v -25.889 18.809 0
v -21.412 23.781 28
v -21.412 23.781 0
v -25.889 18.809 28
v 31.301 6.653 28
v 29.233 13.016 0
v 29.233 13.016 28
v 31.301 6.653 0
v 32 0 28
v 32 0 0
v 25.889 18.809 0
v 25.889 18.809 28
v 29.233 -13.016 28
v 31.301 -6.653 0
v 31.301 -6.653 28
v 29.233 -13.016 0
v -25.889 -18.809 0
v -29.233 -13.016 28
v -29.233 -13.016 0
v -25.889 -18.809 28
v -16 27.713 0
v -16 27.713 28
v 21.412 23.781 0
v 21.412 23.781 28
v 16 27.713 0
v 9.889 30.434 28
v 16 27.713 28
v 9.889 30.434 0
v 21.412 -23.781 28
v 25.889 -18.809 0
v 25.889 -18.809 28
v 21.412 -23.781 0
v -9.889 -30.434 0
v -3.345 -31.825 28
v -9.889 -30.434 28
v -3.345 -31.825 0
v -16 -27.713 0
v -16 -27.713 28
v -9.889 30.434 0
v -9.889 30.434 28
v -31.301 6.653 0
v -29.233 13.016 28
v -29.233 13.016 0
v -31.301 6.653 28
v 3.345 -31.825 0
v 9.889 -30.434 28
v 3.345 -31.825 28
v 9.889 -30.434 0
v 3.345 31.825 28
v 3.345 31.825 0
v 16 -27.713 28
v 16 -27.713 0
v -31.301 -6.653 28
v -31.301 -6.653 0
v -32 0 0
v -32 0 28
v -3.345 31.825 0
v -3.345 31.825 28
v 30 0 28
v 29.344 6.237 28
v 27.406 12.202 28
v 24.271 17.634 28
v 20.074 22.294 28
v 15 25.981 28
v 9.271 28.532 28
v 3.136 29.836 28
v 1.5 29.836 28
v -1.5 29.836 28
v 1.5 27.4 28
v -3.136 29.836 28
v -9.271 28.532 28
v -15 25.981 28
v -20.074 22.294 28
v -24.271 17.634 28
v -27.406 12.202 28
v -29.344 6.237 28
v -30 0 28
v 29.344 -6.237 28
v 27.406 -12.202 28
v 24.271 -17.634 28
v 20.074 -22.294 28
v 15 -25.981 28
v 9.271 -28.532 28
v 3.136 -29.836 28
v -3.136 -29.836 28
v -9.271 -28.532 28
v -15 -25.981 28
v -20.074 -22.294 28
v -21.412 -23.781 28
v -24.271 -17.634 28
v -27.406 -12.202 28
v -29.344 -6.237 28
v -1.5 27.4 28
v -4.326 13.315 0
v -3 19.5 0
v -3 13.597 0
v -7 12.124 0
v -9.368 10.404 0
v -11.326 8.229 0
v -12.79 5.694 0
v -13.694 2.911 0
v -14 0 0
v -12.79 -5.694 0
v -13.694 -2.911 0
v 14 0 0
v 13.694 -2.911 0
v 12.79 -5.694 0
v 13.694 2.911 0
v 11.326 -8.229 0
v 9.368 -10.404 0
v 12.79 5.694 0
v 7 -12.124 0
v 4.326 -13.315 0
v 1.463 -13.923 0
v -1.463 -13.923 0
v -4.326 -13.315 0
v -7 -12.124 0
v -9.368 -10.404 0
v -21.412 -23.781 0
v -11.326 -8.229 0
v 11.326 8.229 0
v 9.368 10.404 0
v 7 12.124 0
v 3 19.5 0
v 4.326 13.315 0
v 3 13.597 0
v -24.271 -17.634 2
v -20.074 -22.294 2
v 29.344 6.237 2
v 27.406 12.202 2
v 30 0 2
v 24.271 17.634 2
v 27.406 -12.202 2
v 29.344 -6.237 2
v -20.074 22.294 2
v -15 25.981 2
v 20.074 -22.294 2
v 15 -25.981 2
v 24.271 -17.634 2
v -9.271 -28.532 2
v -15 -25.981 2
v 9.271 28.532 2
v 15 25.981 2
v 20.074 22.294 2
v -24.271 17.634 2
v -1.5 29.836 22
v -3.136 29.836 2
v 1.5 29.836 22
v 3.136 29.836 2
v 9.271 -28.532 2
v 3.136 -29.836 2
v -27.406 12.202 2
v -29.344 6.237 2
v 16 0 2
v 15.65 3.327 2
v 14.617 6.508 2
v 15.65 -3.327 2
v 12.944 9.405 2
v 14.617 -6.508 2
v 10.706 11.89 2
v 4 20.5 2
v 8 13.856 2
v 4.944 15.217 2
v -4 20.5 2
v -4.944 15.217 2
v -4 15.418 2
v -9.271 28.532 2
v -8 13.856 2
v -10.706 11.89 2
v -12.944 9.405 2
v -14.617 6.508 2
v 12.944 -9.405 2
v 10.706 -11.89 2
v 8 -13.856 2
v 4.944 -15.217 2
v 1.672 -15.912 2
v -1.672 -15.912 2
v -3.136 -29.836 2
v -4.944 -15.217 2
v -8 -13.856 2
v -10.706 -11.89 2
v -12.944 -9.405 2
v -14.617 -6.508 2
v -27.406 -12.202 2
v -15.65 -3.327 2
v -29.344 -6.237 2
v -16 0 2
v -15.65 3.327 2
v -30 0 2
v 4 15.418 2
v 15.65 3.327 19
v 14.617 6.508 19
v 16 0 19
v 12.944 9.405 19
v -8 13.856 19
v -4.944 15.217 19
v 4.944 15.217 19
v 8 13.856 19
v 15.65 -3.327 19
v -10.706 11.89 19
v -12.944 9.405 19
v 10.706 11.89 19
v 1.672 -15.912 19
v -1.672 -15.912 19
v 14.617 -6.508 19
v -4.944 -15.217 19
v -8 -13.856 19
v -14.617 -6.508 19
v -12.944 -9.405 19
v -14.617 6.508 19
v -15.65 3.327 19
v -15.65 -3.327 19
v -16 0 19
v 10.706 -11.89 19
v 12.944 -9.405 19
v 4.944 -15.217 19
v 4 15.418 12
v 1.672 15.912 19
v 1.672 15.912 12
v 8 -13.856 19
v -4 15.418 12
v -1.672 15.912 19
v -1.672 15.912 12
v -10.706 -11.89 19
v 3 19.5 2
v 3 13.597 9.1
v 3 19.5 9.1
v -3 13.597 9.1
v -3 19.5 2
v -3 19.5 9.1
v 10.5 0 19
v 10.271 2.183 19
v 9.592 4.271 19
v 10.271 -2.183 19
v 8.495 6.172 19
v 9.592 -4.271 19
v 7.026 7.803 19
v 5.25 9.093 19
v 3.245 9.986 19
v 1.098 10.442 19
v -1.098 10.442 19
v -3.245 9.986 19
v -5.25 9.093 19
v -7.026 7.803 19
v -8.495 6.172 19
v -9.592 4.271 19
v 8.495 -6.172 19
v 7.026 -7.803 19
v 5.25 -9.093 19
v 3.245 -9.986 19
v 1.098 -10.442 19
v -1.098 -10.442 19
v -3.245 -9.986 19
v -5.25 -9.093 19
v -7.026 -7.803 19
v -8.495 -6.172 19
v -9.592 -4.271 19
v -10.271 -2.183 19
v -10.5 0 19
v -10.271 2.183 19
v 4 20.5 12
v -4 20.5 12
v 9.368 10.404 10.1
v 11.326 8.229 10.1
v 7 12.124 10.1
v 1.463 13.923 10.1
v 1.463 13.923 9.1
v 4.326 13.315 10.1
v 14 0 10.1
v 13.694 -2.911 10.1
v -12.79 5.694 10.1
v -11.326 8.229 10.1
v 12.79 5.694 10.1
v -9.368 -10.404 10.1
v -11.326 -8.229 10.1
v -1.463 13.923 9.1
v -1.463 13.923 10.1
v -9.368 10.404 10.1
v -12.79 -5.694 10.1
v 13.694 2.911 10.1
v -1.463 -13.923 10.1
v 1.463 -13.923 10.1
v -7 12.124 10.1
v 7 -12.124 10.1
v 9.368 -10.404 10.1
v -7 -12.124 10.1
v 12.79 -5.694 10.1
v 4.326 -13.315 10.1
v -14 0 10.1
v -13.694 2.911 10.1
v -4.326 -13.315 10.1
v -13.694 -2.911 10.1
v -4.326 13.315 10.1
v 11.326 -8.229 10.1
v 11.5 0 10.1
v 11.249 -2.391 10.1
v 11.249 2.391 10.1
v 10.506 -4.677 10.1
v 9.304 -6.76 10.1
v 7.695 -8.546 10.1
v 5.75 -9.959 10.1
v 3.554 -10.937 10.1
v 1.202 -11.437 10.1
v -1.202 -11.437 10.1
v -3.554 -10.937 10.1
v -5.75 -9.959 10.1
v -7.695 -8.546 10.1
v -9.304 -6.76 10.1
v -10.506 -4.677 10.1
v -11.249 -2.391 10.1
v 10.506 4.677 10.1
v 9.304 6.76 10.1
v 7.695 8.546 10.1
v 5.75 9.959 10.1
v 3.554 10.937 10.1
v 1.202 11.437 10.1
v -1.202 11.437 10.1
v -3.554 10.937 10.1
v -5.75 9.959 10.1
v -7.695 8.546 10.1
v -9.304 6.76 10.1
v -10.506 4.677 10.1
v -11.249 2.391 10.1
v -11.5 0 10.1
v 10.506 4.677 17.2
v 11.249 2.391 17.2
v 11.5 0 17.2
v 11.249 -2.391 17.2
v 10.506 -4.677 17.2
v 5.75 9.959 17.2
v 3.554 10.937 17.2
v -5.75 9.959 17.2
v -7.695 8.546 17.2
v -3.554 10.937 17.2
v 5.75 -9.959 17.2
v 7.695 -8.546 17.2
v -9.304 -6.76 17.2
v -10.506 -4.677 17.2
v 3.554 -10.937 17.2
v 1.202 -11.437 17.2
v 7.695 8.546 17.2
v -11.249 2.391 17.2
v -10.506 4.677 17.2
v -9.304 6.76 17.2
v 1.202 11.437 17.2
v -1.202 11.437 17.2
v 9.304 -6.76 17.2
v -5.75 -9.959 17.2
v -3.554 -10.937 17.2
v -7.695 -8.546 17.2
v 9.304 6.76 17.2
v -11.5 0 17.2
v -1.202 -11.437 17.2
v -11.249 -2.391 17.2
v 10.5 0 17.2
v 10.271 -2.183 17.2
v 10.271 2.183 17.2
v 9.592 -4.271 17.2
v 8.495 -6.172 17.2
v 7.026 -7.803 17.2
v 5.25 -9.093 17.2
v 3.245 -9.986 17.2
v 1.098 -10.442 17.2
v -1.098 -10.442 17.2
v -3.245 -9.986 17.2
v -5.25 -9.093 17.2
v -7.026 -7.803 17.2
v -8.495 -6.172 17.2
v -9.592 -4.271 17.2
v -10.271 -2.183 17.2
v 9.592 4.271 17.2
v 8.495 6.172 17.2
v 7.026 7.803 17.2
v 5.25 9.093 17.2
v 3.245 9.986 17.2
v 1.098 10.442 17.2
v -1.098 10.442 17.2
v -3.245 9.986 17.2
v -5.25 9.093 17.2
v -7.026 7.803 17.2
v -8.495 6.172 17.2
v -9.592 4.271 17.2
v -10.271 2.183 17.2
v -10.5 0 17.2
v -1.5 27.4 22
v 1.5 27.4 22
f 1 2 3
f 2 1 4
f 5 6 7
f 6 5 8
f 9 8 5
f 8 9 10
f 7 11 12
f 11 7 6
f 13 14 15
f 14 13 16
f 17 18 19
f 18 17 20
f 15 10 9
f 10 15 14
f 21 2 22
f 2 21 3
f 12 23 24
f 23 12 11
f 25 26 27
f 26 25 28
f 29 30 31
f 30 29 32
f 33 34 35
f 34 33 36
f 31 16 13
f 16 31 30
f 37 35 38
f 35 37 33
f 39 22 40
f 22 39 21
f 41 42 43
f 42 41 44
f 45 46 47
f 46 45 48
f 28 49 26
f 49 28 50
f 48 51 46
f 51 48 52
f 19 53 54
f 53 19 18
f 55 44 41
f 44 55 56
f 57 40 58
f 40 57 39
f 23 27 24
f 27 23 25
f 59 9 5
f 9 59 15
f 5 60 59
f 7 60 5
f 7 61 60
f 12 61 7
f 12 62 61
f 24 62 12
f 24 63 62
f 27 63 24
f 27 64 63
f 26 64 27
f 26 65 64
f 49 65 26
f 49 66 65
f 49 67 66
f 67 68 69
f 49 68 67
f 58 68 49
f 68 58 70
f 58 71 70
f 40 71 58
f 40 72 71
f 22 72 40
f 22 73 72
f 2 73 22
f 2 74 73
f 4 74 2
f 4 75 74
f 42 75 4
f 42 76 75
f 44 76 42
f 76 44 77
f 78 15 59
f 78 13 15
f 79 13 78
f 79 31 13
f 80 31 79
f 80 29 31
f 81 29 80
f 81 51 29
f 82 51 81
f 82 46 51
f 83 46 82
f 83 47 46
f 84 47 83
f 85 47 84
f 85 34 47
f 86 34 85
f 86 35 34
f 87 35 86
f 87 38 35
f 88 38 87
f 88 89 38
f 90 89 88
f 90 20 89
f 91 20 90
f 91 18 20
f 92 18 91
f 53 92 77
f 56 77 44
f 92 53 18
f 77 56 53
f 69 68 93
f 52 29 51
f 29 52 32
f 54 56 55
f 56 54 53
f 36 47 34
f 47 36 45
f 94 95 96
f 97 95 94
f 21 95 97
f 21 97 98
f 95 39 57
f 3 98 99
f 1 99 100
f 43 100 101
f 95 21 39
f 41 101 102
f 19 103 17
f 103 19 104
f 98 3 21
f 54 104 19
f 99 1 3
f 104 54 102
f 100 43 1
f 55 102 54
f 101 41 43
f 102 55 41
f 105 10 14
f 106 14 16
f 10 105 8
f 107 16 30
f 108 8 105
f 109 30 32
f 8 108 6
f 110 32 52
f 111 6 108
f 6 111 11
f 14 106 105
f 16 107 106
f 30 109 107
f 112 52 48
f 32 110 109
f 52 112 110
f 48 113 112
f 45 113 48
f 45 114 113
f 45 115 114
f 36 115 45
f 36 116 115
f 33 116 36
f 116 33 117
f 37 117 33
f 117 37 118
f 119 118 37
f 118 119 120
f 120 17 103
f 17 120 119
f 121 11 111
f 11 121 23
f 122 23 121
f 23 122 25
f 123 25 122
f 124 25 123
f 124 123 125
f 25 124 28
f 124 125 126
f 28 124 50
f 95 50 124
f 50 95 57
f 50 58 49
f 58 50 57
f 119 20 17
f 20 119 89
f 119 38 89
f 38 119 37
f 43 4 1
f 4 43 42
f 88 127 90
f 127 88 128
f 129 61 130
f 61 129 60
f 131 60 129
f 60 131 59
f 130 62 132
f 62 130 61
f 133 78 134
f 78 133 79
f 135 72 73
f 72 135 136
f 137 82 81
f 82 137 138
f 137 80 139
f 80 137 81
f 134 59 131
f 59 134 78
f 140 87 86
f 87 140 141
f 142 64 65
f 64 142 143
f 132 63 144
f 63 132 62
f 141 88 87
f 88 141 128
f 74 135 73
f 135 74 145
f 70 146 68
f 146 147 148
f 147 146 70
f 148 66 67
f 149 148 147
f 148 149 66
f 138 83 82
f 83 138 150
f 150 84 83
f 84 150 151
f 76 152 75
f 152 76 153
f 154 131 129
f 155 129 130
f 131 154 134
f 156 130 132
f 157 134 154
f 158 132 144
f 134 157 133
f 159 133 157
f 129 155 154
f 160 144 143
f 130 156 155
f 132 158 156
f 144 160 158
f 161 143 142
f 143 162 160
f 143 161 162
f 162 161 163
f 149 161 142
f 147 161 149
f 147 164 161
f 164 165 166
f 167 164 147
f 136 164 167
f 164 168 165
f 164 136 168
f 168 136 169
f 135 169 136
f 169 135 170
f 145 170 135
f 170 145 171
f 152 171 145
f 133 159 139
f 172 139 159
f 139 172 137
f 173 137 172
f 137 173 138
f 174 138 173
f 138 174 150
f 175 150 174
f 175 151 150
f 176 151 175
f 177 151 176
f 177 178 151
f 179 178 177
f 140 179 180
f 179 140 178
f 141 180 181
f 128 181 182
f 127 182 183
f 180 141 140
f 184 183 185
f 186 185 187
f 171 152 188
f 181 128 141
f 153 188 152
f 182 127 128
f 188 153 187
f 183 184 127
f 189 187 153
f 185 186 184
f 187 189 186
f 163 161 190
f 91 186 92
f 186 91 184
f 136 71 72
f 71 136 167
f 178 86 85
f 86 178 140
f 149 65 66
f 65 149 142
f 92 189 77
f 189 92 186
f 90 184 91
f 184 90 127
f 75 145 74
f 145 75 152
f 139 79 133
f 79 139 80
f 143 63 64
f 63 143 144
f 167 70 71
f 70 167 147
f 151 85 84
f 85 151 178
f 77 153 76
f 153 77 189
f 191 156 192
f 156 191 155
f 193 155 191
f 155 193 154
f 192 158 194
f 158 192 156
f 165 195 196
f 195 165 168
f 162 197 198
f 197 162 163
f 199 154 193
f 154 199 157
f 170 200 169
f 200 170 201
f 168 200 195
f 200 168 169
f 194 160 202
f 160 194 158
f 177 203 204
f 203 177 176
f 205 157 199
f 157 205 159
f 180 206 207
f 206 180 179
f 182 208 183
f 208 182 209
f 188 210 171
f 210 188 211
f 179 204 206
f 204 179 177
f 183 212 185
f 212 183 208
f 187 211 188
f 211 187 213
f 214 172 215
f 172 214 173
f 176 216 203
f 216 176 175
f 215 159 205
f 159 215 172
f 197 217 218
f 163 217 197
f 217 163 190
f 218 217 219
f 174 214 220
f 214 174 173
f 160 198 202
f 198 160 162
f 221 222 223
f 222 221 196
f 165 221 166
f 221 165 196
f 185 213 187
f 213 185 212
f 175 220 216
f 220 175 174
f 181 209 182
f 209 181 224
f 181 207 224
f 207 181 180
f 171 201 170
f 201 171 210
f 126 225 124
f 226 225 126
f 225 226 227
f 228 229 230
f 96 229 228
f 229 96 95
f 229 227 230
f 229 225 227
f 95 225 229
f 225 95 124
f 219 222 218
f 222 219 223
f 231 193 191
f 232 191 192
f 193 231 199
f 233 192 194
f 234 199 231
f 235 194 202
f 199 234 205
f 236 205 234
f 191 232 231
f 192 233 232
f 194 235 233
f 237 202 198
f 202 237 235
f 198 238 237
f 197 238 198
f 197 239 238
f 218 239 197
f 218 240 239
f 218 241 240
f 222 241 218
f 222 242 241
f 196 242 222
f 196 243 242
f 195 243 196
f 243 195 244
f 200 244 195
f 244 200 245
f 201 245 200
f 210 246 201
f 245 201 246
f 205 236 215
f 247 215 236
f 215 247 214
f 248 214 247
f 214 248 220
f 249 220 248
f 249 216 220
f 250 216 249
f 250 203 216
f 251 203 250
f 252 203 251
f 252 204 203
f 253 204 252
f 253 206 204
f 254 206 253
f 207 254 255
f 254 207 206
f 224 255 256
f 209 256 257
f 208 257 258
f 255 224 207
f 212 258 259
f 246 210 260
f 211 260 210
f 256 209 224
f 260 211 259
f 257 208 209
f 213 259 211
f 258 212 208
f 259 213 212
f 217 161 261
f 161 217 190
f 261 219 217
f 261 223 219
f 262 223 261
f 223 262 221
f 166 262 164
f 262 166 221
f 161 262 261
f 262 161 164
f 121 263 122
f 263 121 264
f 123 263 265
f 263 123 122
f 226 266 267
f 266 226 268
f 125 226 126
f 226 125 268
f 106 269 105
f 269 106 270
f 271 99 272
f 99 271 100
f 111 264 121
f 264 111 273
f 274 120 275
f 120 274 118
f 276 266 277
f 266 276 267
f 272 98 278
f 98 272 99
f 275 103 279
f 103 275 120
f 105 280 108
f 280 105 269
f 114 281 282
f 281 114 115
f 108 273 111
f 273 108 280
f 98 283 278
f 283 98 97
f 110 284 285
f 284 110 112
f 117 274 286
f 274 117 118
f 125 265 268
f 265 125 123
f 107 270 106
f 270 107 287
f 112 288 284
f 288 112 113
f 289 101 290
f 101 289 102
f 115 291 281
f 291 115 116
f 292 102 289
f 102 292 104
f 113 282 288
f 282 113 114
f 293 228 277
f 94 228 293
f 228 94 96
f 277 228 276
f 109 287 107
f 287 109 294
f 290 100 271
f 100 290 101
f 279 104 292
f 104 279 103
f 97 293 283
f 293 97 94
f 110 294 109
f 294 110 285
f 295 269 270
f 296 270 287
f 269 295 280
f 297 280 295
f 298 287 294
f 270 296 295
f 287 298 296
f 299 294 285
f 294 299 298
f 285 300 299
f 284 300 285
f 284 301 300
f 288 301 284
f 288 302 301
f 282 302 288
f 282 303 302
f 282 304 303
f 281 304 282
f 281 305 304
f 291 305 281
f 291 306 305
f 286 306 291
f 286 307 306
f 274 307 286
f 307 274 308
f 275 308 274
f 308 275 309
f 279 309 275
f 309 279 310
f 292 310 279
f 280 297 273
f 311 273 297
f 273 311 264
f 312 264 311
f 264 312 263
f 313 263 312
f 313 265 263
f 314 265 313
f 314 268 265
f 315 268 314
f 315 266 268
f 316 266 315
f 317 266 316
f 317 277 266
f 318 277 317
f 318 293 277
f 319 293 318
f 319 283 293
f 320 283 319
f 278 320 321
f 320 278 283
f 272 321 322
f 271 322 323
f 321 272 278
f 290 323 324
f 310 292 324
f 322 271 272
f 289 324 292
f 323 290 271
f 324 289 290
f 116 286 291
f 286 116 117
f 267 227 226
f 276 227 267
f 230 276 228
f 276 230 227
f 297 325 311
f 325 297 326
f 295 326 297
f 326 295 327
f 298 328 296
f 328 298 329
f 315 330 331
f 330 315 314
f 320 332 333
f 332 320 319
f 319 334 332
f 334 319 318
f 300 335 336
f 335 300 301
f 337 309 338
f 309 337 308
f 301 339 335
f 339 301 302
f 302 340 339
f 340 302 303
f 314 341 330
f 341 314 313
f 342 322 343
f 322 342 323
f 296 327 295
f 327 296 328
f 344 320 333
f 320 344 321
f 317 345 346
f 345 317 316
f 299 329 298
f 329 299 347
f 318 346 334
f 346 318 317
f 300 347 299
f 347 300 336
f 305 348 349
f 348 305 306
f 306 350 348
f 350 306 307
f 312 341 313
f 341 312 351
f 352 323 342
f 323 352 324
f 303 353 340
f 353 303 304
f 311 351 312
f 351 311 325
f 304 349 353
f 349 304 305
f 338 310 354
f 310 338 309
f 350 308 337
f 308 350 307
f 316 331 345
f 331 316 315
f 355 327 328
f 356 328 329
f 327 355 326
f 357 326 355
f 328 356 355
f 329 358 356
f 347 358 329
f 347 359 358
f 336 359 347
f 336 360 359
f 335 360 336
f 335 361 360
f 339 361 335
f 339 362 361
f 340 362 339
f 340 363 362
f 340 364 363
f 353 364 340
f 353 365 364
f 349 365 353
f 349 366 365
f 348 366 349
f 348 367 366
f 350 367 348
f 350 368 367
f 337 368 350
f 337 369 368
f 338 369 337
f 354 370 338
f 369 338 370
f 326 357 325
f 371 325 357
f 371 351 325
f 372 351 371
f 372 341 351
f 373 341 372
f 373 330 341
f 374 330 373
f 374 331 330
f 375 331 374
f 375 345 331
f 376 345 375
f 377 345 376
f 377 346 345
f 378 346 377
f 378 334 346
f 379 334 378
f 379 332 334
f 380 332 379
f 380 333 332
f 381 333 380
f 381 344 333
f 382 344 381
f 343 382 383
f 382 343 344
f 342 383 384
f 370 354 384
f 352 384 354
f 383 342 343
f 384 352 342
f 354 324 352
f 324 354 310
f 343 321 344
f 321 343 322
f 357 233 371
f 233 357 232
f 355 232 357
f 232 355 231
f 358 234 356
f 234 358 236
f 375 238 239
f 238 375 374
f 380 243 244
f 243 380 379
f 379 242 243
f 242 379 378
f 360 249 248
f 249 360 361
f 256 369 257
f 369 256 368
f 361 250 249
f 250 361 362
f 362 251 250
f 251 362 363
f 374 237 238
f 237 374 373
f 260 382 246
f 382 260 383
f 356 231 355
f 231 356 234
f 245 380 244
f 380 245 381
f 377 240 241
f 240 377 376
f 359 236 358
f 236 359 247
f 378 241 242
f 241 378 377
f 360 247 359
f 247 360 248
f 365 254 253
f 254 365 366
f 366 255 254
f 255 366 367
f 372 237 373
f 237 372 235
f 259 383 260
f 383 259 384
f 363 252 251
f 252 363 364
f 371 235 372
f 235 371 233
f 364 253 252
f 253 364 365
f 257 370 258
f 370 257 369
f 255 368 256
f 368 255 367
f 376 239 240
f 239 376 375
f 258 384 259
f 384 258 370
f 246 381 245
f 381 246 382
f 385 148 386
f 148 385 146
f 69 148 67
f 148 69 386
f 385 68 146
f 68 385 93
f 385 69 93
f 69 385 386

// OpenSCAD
// file: settingsLenghts.scad
//Ancho de la pared
pared  = 2;
//Radio del centro hueco
radioC = 11;
//Alto de la capa de apertura
aperH = 5.5;
//Ancho de la apertura
aperW = 5+1.1;//Ancho mas holgura
//Ancho del lente macro
macroW = 9.3;
//Profundidad del macro
macroH = 3;
//Profundidad parte de atras y delante
profDelante = 6;
profAtras = 6;
//Ceja entre uniones de cilindros
cejaH = 6;
guiaParedW = 2;
tmpHolg = 1.8;


//Correcc

//
//CÁMARA
camP = 3;//Grueso de la pared del presente modelo
camW = 105;//Ancho de la cámara
camH = 61;//Alto de la cámara
camD = 23.5;//Profundidad de la cámara
camHlg = 6;//Holgura que se deja para los tornillos
camLW = 57/2;//Radio del exterior del lente
torW  = 2;//Radio

//
//Ancho de tubo principal (grande)
mcW = 32;//radio
mcH = 28;

//Dimensiones del difractador
diffW = 51;//Alto y Ancho
diffD=1;//Profundidad del difractador
diffWinW=36;//Ancho de la ventana de difracción
diffWinH=24;//Alto de la ventana de difracción

//
//Adquisición de luz
luzHBig = 10; //donde va el tornillo
luzWBig = 28; //27:diametro donde va el tornillo
luzHBigT = 4; //alto del tornillo
luzWBigT = 6; //6: ancho del tornillo
luzHRosca = 7; //donde va la rosca
luzWRosca = 23; //22:diametro de donde va la rosca



//Cuadro guia para que no se mueva
guiaH = cejaH;
guiaW = 3;



module creaPared(h){
	difference(){
		//Pone el cilindro principal
		cylinder(r=mcW,h);

		//Le quita el contorno exterior
		translate([0,0,-0.1])
		cylinder(r=mcW-pared,h+0.2);
	}
}
module creaGuiaTornilloCentrada(){
	translate([-luzWBigT/2,-luzWBigT/2,0])
	cube([luzWBigT,luzWBigT,luzHBig-1+0.2]);
}
module creaGuiaTornilloCentradaArea(){
	tmpW = luzWBigT + pared;
	tmpH = luzHBig  + pared;
	translate([-tmpW/2,-tmpW/2,0])
	cube([tmpW,tmpW,tmpH]);
}
module creaGuia(h){
	//Pone el circulo soporte
	difference(){
		cylinder(r=mcW,h);
		translate([0,0,-0.1])
		cylinder(r=mcW-pared,h+0.2);
	}
	//Pone la guia1
	translate([0,mcW-pared-(guiaW/2)+0.4,0])
	creaGuiaCentrada(h);
}
module creaGuiaHembra(h){
	//Pone el circulo soporte
	tmpW = mcW-guiaW;	
	creaPared(sopH);
	sopH = 1.35;
	
	//Pone la pared de la guia
	difference(){
		cylinder(r=(mcW-pared),sopH+h);
		translate([0,0,-0.1])
		cylinder(r=(mcW-pared-guiaParedW),sopH+h+0.2);
		//Pone la guia
		translate([-(guiaW/3),tmpW,sopH])
		creaGuiaCentrada(sopH+h+0.2);
		translate([(guiaW/3),tmpW,sopH])
		creaGuiaCentrada(sopH+h+0.2);
	}
}
module creaGuiaCentrada(h){
	translate([-guiaW/2,-guiaW/2,0])
	cube([guiaW,guiaW,h]);
}
// main file
include <settingsLenghts.scad>


/////////////////////////////////////

crearCilAdqLuz();
crearBaseAdqLuz();
//Pone la guia
translate([0,0,mcH-cejaH])
creaGuia(cejaH);







module crearCilAdqLuz(){
	difference(){
		//Área grande
		cylinder(r=mcW,mcH);
		//Quita relleno para dejar pared
		translate([0,0,pared])
		cylinder(r=mcW-pared,mcH);		
		//Quita área del cilindro central
		translate([0,0,-0.2])
		cylinder(r=(luzWBig/2)+pared,pared*2);
		//Quita área del cuadrado
		translate([0, (luzWBig/2 + luzWBigT/2)-0.5, -0.1])
		creaGuiaTornilloCentrada();
	}
}

module crearAreaLuz(){
	cylinder(r=(luzWBig/2)+pared,luzHBig+luzHRosca+pared);
	translate([0, (luzWBig/2 + luzWBigT/2)-0.5, 0])
	creaGuiaTornilloCentradaArea();
}

module crearBaseAdqLuz(){
	difference(){
		//Toda el área de trabajo
		crearAreaLuz();

		//Cilindro para que entre lente adquicisión de luz
		translate([0, 0, -0.1])
		cylinder(r=luzWBig/2,luzHBig+0.2);

		//Espacio para que entre el tornillo
		translate([0, (luzWBig/2 + luzWBigT/2)-0.5, -0.1])
		creaGuiaTornilloCentrada();
	
		//Espacio para que entre la rosca
		translate([0, 0, luzHBig])
		cylinder(r=luzWRosca/2,luzHRosca+0.2);

		//Área donde sienta el lente y sirve para bloquear la 
		//luz de las paredes
		translate([0, 0, luzHBig+luzHRosca])
		cylinder(r=(luzWRosca/2)-1,mcH);
	}
}



module cilindroPared(h){
	translate([0, 0, h/2]){
		difference(){
			cylinder(r=radioC+pared,h, center=true);
			cylinder(r=radioC,h+2, center=true);
		}
	}
}

module apertura(){
	//Crea apertura
	translate([0, 0, (aperH/2)+profDelante ]){
		difference(){
			cylinder(r=radioC+1,aperH,center=true);
			translate([0, 0, aperH-macroH]){
				cylinder(r=macroW/2,aperH,center=true);
			}
			cube([aperW,aperW,aperH+2],center=true);		
		}
	}
}
